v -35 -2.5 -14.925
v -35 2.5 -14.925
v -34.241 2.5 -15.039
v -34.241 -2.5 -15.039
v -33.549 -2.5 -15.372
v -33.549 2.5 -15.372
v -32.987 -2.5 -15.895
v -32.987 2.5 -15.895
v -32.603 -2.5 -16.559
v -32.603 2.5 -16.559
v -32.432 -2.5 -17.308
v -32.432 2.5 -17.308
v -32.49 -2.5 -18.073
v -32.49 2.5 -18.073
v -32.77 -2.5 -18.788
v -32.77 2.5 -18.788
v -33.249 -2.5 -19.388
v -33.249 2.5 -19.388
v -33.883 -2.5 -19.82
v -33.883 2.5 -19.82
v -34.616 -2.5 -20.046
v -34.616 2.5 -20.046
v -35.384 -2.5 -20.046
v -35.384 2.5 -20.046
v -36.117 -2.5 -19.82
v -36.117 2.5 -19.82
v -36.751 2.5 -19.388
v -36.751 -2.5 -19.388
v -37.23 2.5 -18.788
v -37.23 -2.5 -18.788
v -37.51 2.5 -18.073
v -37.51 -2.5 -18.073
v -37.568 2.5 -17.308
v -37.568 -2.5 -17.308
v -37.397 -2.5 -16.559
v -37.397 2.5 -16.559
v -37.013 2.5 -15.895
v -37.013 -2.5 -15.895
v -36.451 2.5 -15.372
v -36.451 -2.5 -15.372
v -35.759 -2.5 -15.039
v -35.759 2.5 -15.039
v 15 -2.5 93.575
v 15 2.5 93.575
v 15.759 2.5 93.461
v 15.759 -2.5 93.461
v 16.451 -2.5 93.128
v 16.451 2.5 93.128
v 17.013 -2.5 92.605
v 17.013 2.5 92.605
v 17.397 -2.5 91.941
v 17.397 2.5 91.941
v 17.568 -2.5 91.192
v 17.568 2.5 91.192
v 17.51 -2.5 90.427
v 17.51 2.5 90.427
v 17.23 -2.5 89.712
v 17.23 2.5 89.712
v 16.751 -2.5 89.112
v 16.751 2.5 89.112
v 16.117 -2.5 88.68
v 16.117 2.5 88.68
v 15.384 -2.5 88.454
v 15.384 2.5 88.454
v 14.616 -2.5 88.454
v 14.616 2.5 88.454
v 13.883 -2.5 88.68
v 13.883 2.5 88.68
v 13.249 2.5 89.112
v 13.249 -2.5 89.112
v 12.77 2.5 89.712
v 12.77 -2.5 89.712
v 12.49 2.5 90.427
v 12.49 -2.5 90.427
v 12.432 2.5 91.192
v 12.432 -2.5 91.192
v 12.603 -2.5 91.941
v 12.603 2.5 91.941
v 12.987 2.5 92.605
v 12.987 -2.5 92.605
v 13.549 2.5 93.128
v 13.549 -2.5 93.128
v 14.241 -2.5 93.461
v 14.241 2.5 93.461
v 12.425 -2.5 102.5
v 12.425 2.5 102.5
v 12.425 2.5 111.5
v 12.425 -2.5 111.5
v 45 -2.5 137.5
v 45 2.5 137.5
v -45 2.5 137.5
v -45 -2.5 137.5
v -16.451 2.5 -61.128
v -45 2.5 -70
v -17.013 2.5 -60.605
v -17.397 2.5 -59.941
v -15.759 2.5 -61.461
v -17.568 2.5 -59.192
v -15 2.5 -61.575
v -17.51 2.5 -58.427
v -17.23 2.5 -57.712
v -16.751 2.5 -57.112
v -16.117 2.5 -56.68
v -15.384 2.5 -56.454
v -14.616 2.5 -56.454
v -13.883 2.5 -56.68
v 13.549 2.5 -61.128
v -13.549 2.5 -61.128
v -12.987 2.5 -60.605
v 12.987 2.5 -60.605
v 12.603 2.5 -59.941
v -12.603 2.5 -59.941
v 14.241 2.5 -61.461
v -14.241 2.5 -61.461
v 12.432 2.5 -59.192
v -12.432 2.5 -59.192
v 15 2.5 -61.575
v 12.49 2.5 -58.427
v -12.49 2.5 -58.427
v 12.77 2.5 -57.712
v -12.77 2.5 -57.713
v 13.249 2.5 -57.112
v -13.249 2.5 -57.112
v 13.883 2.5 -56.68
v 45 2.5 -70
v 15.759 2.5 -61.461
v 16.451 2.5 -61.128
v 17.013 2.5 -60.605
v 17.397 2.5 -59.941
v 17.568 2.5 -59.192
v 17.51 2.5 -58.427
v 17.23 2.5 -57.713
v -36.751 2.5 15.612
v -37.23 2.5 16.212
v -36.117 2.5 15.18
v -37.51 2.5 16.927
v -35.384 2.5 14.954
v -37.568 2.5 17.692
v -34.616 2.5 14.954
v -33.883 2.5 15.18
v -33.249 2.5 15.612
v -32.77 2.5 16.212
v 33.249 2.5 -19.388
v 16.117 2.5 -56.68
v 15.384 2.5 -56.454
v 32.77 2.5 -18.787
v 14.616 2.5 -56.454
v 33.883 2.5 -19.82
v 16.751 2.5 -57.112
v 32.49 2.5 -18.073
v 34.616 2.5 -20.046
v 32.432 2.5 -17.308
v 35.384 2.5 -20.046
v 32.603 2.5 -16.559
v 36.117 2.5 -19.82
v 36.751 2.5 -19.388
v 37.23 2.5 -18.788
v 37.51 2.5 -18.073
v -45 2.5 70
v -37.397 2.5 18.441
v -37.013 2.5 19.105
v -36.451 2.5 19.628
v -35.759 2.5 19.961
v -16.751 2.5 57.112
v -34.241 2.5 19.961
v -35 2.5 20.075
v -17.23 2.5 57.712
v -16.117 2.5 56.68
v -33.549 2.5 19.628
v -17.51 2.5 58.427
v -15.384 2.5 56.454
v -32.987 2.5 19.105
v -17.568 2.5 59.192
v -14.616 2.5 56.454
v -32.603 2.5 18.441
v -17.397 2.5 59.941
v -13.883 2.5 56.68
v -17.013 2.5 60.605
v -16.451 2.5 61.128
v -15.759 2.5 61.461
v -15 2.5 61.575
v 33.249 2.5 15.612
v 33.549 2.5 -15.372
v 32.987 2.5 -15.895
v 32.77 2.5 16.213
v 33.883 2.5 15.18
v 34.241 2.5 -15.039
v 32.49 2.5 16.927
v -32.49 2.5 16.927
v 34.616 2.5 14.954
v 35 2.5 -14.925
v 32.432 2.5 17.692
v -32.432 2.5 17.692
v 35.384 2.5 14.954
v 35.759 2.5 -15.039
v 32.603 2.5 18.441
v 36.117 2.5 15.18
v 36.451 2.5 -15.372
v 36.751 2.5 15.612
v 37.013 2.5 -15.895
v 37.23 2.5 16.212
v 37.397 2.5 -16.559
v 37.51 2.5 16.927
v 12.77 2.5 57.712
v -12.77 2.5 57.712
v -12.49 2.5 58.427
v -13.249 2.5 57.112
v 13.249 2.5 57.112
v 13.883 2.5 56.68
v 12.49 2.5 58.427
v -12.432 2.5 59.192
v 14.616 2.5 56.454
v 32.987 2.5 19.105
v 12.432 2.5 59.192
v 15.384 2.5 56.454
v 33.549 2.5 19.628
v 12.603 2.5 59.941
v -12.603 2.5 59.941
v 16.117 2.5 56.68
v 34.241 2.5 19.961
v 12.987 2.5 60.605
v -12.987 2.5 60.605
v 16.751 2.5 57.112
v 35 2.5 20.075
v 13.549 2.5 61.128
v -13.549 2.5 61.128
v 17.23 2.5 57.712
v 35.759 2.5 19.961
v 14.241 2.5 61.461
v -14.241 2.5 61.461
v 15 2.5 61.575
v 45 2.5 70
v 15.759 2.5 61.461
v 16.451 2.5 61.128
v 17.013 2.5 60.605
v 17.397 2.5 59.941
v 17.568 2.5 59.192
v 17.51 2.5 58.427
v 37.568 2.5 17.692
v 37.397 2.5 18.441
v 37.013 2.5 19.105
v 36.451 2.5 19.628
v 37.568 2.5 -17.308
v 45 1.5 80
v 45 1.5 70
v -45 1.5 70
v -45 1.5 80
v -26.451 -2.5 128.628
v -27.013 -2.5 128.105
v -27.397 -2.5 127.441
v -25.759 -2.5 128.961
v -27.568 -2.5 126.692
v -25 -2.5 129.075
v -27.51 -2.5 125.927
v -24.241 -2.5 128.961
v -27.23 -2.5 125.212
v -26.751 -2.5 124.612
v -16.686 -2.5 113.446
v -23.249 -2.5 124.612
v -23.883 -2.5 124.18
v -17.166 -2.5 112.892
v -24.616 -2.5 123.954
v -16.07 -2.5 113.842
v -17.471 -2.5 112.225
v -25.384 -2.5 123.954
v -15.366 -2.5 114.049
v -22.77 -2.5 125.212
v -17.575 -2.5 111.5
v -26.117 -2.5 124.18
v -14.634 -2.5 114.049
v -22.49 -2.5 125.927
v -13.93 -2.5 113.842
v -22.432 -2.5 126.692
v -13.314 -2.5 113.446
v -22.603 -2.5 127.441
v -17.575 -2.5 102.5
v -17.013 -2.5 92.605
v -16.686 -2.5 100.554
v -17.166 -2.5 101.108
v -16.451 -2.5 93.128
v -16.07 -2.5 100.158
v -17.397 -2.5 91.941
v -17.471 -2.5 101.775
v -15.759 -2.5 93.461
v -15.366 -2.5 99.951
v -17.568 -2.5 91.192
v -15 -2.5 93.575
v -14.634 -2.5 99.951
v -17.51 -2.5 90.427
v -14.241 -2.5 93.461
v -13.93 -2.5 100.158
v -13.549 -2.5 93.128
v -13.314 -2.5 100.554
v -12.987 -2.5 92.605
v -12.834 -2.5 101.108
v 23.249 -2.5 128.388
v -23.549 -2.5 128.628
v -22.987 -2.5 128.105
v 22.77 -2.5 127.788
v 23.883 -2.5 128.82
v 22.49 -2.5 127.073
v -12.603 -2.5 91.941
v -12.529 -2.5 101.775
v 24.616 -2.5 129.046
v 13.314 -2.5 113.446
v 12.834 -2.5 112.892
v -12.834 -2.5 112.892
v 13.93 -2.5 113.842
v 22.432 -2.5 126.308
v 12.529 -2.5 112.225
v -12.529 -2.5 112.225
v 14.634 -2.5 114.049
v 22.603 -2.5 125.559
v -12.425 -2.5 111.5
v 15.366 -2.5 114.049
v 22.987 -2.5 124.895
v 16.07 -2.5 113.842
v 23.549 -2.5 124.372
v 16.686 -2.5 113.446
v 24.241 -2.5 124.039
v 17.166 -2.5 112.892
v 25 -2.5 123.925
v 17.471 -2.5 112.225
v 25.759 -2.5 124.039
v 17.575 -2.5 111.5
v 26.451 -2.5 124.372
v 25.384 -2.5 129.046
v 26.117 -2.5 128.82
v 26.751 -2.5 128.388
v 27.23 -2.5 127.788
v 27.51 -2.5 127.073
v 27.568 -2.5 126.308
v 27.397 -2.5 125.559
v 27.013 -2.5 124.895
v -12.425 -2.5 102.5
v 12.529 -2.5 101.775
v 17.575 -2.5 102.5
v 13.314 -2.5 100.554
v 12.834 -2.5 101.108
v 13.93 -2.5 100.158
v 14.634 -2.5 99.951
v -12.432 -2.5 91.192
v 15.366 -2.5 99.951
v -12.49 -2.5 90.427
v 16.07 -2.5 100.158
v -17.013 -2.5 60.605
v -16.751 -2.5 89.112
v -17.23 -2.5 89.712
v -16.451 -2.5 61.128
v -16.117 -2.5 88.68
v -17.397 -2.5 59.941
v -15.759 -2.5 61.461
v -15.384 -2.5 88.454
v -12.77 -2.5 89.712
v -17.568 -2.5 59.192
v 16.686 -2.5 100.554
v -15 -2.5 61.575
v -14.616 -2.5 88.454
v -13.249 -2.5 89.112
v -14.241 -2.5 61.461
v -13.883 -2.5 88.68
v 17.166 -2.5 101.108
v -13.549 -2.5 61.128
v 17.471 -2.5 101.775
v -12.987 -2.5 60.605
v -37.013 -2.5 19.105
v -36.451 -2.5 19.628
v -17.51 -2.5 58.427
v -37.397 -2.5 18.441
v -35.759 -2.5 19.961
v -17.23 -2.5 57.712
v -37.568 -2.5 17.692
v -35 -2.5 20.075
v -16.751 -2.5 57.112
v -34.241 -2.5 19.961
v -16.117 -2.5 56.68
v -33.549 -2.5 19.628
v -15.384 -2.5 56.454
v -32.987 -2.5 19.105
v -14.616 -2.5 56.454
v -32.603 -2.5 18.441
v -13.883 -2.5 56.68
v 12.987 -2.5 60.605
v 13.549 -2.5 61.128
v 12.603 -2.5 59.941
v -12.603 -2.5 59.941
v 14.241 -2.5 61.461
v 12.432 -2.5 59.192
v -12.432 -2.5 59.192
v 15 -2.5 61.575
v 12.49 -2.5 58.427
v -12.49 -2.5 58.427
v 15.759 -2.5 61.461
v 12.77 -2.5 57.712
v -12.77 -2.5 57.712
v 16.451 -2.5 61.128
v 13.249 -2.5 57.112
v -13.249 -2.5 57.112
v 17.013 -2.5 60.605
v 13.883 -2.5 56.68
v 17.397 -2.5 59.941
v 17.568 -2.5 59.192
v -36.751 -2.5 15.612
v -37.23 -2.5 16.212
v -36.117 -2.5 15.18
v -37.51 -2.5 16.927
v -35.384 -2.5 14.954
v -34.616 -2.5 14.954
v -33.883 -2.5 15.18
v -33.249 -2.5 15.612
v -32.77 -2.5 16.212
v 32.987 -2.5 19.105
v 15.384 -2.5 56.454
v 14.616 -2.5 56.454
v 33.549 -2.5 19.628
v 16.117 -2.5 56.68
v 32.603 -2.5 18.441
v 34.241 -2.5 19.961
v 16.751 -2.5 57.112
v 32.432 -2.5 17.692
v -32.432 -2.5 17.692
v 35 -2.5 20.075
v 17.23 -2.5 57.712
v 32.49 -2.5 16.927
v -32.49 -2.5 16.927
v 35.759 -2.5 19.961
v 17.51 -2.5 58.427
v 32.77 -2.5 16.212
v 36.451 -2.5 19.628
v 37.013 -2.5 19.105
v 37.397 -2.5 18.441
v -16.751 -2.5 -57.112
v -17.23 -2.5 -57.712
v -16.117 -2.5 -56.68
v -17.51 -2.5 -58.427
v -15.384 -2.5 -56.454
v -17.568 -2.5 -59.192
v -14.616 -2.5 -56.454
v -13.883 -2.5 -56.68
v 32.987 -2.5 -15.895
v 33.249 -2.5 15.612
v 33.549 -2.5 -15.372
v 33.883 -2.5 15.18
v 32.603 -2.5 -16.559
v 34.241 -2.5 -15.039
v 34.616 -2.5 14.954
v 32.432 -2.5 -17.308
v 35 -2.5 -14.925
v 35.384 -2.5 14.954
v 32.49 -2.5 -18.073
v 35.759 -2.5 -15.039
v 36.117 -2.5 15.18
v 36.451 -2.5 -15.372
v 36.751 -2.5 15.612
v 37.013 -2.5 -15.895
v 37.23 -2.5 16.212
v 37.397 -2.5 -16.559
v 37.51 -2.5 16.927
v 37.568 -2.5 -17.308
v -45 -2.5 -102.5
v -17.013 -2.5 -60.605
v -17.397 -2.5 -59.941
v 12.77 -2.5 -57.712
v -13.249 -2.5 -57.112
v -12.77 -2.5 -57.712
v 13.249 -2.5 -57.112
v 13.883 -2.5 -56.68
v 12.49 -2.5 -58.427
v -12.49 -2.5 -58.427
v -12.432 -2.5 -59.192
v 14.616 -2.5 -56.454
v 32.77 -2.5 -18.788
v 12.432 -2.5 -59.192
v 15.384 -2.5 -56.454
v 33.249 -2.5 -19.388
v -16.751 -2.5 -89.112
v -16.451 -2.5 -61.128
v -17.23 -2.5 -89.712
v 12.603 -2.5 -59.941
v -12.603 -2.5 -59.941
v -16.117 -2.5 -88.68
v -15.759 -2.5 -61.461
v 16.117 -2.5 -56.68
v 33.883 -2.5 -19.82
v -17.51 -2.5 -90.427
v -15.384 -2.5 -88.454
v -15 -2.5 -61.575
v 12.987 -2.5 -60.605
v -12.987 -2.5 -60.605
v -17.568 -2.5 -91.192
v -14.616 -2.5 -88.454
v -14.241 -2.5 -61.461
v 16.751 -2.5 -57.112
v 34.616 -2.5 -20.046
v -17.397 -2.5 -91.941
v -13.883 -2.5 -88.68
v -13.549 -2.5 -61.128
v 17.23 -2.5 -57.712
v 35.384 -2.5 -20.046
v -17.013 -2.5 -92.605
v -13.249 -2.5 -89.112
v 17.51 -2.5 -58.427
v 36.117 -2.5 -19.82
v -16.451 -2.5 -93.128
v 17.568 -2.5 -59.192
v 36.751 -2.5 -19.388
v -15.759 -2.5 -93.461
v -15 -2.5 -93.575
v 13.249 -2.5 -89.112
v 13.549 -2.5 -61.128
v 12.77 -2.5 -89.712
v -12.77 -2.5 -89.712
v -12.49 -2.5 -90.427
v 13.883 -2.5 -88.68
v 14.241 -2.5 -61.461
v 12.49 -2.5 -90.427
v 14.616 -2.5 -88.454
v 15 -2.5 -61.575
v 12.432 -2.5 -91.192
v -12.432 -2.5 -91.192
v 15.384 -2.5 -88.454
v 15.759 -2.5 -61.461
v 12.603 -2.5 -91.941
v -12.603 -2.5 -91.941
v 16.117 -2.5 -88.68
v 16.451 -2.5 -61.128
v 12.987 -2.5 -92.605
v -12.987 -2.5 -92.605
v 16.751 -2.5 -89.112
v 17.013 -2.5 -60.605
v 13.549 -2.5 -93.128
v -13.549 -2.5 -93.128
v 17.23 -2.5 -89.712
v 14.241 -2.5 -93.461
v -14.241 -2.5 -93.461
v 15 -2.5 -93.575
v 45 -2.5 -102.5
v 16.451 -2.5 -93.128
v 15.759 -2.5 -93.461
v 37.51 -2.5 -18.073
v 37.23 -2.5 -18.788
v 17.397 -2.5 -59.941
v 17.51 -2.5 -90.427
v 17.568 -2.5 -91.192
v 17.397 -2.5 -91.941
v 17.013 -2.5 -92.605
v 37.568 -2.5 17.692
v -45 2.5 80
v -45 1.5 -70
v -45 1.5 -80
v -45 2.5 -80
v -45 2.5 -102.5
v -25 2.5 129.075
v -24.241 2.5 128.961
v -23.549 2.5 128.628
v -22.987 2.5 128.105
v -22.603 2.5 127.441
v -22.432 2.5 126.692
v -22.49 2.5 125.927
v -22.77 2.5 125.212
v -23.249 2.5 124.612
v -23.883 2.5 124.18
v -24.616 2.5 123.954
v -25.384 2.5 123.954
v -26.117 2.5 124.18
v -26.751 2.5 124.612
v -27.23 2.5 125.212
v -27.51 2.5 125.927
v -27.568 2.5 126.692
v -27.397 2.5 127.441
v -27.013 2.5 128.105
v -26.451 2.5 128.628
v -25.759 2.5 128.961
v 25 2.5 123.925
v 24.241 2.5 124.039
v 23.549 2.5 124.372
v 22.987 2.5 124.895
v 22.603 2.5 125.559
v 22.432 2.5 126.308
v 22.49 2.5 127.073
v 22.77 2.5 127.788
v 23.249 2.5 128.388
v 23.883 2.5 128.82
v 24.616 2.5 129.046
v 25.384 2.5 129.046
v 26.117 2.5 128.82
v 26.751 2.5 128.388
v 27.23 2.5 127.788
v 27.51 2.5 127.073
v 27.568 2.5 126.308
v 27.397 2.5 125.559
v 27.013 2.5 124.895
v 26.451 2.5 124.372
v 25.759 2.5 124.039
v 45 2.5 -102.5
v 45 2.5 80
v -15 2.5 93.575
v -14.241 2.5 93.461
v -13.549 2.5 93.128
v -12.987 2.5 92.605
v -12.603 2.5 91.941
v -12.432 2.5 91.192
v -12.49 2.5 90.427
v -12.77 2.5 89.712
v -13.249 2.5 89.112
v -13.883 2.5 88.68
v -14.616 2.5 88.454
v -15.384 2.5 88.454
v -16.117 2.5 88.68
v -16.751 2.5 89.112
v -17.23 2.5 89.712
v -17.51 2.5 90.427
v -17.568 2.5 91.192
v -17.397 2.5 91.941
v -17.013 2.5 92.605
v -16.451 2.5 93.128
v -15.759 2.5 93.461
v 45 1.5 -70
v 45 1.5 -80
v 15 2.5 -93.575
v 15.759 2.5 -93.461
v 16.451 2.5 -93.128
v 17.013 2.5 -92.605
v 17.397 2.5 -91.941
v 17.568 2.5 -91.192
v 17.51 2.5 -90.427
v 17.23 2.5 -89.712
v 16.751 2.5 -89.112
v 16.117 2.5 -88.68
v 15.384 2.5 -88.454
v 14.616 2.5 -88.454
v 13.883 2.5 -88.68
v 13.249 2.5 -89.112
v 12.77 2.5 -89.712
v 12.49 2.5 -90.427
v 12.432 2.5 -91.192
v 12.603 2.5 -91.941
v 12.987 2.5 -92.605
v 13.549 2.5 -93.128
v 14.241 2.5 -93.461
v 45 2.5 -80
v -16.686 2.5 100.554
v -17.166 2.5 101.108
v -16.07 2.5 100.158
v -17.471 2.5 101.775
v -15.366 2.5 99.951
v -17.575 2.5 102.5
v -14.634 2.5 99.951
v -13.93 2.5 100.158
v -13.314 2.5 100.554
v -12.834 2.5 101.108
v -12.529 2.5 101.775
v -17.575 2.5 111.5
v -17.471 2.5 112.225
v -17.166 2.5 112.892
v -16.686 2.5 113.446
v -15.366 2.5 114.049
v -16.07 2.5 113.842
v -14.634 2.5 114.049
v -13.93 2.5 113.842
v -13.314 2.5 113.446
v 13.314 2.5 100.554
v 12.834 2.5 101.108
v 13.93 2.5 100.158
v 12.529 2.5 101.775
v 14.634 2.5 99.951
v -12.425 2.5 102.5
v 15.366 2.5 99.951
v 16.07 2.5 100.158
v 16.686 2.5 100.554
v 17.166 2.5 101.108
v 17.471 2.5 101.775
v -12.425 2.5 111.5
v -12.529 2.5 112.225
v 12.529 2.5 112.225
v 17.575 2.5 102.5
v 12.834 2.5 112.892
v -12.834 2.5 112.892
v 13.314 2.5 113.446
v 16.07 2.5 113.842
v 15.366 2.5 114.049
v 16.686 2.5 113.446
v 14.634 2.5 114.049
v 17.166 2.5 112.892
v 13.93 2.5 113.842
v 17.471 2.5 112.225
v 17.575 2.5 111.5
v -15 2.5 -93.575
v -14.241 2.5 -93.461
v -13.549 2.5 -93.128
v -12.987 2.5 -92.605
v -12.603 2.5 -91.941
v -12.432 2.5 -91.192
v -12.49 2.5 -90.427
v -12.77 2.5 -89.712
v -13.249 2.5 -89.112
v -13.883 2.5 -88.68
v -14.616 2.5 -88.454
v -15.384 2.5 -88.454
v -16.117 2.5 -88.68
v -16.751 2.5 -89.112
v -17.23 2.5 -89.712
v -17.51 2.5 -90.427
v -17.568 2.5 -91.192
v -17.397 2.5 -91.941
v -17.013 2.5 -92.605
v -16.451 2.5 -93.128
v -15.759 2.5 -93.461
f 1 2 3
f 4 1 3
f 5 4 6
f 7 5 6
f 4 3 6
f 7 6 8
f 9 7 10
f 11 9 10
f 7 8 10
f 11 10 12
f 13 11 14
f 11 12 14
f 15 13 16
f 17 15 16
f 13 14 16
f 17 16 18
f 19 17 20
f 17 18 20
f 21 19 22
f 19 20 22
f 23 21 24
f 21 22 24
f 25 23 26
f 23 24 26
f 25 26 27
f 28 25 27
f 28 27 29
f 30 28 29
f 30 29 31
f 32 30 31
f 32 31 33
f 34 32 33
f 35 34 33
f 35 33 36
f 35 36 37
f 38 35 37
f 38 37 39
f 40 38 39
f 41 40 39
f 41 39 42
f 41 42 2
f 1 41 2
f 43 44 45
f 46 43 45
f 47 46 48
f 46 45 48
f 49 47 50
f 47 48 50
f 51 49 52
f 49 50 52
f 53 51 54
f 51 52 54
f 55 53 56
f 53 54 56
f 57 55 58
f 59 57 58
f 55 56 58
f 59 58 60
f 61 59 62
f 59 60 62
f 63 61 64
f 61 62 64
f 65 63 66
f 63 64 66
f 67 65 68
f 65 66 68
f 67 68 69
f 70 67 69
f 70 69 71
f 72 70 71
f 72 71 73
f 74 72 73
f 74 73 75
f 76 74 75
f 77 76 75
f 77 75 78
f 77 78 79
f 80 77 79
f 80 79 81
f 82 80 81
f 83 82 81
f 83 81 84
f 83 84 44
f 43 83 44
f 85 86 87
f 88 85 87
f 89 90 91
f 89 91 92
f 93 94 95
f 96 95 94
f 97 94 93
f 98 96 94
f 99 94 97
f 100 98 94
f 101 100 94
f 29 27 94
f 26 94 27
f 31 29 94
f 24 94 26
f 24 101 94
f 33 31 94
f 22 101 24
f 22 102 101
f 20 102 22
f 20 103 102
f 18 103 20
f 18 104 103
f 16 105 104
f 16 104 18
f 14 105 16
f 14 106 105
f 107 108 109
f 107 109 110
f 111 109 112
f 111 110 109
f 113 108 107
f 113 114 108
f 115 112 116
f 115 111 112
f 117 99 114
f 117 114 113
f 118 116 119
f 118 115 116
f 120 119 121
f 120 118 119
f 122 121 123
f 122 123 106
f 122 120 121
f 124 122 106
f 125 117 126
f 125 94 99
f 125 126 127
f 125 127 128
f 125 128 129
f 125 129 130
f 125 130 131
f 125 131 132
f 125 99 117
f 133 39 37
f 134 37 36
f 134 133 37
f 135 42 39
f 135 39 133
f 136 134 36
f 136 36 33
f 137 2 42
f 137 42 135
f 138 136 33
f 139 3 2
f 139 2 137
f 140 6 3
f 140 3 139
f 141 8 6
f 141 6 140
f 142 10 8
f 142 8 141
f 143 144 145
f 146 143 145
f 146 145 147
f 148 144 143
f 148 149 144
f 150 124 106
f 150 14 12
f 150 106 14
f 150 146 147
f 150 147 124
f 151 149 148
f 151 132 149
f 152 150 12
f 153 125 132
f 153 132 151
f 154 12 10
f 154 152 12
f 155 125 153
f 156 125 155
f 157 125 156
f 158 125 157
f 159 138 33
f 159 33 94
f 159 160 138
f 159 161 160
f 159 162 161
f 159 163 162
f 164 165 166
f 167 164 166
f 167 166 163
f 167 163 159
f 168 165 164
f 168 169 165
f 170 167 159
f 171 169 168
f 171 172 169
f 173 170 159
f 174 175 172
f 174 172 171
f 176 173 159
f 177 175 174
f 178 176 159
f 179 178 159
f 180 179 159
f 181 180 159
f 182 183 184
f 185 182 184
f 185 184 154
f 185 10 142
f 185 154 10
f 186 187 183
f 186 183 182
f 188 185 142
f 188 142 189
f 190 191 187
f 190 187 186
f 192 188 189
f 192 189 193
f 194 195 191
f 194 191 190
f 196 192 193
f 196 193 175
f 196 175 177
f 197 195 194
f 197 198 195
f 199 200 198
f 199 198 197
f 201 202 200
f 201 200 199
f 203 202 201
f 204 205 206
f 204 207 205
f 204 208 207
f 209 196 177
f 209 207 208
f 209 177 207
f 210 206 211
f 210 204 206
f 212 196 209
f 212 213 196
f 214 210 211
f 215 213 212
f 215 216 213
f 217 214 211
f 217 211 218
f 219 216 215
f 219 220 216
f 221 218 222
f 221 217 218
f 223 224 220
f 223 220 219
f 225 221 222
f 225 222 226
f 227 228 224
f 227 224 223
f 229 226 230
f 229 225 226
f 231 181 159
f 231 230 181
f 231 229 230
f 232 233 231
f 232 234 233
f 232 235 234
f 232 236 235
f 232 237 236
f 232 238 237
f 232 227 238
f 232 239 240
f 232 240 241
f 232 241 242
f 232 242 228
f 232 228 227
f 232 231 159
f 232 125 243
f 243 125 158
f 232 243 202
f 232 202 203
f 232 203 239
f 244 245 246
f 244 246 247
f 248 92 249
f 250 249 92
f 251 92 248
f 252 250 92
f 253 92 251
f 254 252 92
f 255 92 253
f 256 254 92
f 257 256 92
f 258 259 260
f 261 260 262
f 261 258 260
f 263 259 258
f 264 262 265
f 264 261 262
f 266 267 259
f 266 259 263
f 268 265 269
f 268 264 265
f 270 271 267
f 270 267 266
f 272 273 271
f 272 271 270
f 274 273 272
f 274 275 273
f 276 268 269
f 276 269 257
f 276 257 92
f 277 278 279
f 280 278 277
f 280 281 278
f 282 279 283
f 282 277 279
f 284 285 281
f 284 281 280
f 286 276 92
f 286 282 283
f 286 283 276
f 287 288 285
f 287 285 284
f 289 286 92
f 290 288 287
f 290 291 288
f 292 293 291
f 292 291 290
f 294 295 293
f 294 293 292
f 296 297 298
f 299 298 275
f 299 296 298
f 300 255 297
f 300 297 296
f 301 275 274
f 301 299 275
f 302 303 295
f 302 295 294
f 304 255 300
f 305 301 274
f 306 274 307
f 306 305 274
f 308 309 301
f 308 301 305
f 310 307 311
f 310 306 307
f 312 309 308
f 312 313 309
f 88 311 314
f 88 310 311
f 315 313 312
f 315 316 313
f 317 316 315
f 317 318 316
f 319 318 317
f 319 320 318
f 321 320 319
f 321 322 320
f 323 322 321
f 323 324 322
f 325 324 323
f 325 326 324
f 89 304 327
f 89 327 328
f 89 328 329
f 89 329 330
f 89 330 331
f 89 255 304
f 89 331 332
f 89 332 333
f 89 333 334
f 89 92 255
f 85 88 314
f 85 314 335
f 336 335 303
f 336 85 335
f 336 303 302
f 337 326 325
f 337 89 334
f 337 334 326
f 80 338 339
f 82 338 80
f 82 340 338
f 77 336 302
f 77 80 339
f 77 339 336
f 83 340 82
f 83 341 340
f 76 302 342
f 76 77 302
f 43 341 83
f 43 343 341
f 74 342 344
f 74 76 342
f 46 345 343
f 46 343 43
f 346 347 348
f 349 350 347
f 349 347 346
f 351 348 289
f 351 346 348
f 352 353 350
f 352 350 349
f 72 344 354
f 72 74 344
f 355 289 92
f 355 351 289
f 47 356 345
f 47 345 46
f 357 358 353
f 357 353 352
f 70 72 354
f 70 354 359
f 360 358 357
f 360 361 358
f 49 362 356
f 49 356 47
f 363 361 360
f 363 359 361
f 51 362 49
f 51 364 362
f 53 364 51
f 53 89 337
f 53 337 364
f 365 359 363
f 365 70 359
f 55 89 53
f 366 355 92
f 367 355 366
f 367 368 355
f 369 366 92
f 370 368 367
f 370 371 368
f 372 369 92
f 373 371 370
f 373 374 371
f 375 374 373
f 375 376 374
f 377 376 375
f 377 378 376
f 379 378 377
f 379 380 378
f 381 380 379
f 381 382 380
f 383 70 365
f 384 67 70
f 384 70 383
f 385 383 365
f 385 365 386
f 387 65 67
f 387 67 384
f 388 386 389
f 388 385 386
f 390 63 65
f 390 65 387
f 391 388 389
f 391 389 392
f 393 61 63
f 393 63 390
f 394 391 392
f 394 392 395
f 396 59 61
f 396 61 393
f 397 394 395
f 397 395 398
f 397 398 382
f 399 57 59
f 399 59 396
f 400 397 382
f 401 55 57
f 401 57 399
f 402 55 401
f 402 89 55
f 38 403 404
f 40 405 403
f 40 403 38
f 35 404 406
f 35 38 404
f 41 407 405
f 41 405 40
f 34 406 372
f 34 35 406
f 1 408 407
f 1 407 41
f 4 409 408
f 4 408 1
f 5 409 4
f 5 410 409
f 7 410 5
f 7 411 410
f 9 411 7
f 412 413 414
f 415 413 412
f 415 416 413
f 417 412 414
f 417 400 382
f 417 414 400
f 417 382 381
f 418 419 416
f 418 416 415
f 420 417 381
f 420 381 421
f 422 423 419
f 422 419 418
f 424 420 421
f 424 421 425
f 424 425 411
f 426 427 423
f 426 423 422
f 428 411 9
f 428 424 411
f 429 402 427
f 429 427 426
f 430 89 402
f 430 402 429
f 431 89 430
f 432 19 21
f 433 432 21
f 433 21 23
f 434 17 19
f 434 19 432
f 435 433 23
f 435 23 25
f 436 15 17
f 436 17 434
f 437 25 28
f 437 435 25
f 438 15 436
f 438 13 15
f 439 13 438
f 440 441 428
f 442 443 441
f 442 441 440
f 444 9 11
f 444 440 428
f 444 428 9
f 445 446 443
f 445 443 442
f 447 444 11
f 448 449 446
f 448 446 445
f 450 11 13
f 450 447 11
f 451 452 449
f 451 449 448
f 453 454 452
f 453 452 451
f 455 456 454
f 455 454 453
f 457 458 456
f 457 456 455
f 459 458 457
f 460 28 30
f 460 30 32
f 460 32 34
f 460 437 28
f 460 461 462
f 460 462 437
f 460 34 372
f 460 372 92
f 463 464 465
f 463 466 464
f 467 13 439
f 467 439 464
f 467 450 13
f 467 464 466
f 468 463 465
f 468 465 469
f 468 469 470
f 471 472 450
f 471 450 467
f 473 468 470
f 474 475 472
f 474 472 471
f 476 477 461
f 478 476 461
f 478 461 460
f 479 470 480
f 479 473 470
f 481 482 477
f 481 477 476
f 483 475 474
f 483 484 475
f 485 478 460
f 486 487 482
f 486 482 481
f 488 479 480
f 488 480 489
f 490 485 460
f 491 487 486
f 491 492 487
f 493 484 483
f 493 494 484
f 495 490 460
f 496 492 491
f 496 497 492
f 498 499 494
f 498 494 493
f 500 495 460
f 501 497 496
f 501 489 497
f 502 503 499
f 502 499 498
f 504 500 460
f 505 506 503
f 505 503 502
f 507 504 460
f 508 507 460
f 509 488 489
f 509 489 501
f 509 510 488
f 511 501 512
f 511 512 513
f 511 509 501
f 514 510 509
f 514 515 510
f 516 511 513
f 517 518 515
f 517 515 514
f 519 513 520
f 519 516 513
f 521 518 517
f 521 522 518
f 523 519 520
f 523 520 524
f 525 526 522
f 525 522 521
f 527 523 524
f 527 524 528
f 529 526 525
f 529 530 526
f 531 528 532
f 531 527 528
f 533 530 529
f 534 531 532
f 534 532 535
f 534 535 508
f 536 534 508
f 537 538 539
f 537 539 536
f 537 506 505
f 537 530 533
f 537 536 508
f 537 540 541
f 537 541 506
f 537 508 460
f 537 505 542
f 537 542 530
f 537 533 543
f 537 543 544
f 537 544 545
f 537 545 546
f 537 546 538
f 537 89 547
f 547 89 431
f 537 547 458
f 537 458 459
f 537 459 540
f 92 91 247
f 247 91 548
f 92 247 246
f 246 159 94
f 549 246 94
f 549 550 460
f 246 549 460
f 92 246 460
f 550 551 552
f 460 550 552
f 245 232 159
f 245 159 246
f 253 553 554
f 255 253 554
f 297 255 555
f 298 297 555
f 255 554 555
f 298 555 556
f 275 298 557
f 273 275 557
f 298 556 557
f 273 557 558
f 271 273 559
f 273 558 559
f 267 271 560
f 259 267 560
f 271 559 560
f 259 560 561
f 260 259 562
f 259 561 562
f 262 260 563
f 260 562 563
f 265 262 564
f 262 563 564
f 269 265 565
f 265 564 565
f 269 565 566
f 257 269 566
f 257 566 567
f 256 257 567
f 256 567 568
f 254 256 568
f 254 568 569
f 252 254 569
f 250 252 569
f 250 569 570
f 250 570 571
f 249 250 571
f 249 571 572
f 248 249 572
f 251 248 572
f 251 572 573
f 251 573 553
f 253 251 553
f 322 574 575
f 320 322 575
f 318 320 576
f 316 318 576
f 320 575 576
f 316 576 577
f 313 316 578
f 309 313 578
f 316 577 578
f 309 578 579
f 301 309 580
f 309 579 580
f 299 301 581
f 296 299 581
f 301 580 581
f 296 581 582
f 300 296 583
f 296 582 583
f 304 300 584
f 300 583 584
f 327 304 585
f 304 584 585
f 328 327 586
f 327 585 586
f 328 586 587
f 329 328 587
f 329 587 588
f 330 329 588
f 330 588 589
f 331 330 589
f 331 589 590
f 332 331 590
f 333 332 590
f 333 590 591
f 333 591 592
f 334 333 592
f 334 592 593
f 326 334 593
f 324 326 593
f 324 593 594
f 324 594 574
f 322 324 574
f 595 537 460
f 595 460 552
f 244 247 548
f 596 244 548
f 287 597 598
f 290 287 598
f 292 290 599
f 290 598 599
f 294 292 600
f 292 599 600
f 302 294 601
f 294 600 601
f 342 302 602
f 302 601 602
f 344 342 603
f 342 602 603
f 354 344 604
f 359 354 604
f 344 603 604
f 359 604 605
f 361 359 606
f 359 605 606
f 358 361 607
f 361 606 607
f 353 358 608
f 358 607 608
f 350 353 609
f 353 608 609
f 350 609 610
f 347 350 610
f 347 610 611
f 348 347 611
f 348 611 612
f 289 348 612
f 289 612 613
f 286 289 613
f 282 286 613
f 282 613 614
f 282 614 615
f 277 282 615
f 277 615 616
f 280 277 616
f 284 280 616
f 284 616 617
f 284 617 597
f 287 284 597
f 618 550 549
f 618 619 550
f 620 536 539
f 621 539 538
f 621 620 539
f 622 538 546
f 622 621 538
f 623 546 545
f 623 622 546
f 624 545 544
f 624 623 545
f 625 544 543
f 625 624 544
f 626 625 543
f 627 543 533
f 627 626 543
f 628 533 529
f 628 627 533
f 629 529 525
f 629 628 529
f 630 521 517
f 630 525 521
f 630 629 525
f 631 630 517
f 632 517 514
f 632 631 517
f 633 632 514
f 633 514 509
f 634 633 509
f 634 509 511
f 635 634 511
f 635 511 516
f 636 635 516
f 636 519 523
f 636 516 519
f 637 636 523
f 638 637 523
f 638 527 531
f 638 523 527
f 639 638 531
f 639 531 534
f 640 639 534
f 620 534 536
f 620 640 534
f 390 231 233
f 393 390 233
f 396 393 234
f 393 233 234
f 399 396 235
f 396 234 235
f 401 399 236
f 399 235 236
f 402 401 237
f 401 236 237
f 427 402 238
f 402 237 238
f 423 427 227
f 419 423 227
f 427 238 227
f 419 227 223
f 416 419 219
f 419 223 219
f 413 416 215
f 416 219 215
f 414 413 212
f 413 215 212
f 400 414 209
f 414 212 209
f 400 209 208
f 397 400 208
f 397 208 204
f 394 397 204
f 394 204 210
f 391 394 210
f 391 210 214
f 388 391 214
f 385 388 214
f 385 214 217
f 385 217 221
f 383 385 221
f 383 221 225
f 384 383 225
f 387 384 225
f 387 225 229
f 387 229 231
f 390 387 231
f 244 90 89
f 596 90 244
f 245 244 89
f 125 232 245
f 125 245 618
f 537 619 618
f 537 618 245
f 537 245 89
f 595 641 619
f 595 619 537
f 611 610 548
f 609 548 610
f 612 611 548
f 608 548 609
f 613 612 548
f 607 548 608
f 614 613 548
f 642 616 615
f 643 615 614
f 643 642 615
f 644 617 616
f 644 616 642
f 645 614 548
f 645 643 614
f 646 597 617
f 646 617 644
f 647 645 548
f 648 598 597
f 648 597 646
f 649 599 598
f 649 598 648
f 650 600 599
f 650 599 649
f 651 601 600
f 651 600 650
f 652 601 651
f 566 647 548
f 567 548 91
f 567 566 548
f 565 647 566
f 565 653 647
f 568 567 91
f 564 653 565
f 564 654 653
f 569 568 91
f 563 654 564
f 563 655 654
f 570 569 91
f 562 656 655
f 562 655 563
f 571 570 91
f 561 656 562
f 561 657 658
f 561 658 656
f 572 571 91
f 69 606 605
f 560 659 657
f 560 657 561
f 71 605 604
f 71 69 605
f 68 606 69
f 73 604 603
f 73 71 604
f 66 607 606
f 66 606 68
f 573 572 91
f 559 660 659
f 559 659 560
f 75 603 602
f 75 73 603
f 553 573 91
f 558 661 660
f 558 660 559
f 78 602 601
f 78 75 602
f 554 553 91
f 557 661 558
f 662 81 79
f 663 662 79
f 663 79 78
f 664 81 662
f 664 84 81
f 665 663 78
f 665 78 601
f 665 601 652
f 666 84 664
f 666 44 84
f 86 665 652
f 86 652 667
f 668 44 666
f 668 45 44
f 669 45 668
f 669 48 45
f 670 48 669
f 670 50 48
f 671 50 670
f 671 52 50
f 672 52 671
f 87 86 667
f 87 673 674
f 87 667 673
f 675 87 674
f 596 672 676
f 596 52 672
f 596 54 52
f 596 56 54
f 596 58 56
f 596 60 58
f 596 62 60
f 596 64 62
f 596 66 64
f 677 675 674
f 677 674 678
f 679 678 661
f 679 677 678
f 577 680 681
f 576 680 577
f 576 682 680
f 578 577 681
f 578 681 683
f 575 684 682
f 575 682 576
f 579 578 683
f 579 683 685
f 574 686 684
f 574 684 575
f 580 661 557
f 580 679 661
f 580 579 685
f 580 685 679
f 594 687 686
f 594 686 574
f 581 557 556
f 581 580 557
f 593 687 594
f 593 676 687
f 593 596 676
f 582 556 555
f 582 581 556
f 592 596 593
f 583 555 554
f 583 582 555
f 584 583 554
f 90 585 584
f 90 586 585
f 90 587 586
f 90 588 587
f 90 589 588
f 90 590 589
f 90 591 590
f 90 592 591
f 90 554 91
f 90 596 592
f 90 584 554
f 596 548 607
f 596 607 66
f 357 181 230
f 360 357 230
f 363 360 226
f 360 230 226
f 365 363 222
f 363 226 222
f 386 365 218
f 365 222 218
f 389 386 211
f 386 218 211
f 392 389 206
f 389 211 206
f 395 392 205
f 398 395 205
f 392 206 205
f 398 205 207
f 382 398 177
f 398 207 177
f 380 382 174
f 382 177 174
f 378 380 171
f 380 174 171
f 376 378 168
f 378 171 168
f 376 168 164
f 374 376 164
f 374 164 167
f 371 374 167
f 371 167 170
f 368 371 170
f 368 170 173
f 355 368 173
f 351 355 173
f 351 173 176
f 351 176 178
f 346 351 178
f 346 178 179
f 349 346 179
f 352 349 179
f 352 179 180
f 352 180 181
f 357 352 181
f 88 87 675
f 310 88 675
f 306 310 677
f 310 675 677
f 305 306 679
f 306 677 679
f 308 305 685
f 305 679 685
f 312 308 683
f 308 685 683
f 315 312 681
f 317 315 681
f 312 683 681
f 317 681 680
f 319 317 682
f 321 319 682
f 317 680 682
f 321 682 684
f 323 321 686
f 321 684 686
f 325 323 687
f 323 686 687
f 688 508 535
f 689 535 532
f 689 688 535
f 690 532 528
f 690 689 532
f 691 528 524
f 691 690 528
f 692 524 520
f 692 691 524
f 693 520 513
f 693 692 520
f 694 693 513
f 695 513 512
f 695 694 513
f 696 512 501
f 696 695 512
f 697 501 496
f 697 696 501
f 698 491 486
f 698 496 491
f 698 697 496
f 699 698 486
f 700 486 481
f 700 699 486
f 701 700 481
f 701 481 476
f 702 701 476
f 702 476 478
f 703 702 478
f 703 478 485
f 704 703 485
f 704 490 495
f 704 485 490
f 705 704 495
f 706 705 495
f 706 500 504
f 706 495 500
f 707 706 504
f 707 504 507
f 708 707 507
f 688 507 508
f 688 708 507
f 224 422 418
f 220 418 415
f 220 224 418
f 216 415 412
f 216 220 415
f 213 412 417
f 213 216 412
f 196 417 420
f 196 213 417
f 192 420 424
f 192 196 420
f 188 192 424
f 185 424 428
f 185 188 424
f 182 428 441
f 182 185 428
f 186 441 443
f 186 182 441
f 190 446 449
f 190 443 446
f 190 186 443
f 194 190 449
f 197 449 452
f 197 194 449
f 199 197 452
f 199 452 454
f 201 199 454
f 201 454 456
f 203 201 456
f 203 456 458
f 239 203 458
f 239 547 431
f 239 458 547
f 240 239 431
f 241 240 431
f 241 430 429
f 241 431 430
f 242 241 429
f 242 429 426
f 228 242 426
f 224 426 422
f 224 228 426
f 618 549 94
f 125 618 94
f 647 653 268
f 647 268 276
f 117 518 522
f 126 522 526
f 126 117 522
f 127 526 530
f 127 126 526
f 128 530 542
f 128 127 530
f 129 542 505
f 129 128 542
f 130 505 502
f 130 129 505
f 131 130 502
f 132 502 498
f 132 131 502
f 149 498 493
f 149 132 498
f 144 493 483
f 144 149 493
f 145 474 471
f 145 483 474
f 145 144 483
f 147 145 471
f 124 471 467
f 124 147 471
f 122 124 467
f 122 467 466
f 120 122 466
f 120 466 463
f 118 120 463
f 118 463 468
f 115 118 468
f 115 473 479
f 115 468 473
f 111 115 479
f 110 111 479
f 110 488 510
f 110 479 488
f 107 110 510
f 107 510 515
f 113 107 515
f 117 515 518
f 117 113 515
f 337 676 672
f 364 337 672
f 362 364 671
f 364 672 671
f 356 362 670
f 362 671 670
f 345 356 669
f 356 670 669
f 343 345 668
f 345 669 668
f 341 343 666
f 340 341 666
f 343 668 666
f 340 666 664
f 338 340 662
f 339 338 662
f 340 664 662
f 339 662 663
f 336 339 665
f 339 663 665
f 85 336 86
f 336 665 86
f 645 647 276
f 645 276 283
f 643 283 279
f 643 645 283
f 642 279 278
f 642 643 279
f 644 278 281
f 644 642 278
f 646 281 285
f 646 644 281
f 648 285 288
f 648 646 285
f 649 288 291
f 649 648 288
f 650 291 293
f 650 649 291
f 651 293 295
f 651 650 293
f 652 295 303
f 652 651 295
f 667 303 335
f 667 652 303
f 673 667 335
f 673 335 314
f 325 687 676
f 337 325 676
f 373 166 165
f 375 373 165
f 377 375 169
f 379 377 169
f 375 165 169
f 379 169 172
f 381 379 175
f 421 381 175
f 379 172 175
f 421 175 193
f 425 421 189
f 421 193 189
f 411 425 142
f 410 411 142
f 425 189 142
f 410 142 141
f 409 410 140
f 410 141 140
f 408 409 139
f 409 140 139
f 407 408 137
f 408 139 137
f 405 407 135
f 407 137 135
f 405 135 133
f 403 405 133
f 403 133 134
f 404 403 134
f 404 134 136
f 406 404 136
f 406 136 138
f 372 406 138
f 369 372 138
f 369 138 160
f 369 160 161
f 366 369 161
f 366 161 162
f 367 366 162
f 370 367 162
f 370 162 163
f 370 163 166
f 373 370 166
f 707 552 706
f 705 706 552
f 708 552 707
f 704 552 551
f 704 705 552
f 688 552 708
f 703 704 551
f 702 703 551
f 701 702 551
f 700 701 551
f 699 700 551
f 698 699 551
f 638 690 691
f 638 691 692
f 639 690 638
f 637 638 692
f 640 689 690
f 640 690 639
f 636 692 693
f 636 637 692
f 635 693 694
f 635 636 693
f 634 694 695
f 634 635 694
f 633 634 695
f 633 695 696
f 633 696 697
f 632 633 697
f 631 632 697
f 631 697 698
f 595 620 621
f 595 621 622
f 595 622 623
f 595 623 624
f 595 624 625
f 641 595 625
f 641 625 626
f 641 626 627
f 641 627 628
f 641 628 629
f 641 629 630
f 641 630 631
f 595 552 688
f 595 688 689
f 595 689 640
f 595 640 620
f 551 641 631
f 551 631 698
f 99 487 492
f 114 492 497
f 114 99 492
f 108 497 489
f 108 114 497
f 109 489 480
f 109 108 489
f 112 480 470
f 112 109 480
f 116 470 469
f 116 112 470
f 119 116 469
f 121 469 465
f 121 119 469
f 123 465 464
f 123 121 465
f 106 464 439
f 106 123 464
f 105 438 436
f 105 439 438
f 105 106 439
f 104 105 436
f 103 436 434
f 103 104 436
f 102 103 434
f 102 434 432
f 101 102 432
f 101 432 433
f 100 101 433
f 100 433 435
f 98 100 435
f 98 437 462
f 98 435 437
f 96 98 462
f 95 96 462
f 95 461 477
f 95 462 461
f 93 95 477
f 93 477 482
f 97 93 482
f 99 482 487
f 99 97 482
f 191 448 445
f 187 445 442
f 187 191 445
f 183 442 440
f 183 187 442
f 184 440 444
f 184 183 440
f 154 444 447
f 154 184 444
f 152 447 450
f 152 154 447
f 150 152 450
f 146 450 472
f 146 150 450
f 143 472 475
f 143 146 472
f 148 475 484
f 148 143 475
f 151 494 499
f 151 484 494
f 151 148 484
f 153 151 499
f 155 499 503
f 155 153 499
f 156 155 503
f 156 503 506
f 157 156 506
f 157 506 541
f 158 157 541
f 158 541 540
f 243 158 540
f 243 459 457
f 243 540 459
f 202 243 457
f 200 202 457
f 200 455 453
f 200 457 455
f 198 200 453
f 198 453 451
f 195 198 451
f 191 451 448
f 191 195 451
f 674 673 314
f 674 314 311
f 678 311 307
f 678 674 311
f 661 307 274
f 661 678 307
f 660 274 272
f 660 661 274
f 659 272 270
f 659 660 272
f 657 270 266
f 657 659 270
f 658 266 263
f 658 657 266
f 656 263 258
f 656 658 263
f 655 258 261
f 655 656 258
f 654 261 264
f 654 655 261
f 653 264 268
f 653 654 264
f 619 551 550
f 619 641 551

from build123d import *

# Parameters (mm, degrees)
SKETCH1_W           = 45
SKETCH1_H           = 5
BOSS_EXTRUDE1_DEPTH = 102.5
SKETCH2_R           = 2.575
CUT_EXTRUDE1_DEPTH  = 106.059506947
SKETCH3_W           = 10
SKETCH3_H           = 1
CUT_EXTRUDE2_DEPTH  = 112.970978383
SKETCH4_W           = 45
SKETCH4_H           = 5
BOSS_EXTRUDE2_DEPTH = 35
BOSS_EXTRUDE3_DEPTH = 22.5
SKETCH6_R           = 2.575
CUT_EXTRUDE3_DEPTH  = 145.762736918
SKETCH7_R           = 2.575
CUT_EXTRUDE4_DEPTH  = 145.762736918
CUT_EXTRUDE5_DEPTH  = 145.762736918


with BuildPart() as part:
    # Sketch1 → Boss-Extrude1 (new body)
    with BuildSketch(Plane.XY):
        Rectangle(SKETCH1_W, SKETCH1_H)
    boss_extrude1 = extrude(amount=BOSS_EXTRUDE1_DEPTH)

    # Sketch2 → Cut-Extrude1 (cut, through all)
    with BuildSketch(Plane(origin=(0, 2.5, 0), x_dir=(1, 0, 0), z_dir=(0, 1, 0))):
        with Locations(Location((-15, -59, 0), (0, 0, 270))):
            Circle(SKETCH2_R)
        with Locations(Location((15, -59, 0), (0, 0, 270))):
            Circle(SKETCH2_R)
        with Locations(Location((-15, -91, 0), (0, 0, 270))):
            Circle(SKETCH2_R)
        with Locations(Location((15, -91, 0), (0, 0, 270))):
            Circle(SKETCH2_R)
    cut_extrude1 = extrude(amount=-CUT_EXTRUDE1_DEPTH, mode=Mode.SUBTRACT)

    # Sketch3 → Cut-Extrude2 (cut, through all)
    with BuildSketch(Plane(origin=(22.5, 0, 0), x_dir=(0, 0, -1), z_dir=(1, 0, 0))):
        with Locations((-75, 2)):
            Rectangle(SKETCH3_W, SKETCH3_H)
    cut_extrude2 = extrude(amount=-CUT_EXTRUDE2_DEPTH, mode=Mode.SUBTRACT)

    # Mirror1: Boss-Extrude1, Cut-Extrude1, Cut-Extrude2 across plane
    add(boss_extrude1.mirror(Plane.XY))
    add(cut_extrude1.mirror(Plane.XY), mode=Mode.SUBTRACT)
    add(cut_extrude2.mirror(Plane.XY), mode=Mode.SUBTRACT)

    # Sketch4 → Boss-Extrude2 (add)
    with BuildSketch(Plane.XY.offset(102.5)):
        Rectangle(SKETCH4_W, SKETCH4_H)
    extrude(amount=BOSS_EXTRUDE2_DEPTH)

    # Sketch5 → Boss-Extrude3 (add)
    with BuildSketch(Plane(origin=(22.5, 0, 0), x_dir=(0, 0, -1), z_dir=(1, 0, 0))):
        Polygon((70, 1.5), (70, 2.5), (-70, 2.5), (-70, 1.5), (-80, 1.5), (-80, 2.5), (-137.5, 2.5), (-137.5, -2.5), (102.5, -2.5), (102.5, 2.5), (80, 2.5), (80, 1.5), align=None)
    boss_extrude3 = extrude(amount=BOSS_EXTRUDE3_DEPTH)

    # Mirror2: Boss-Extrude3 across plane
    add(boss_extrude3.mirror(Plane(origin=(0, 0, 0), x_dir=(0, 0, 1), z_dir=(1, 0, 0))))

    # Sketch6 → Cut-Extrude3 (cut, through all)
    with BuildSketch(Plane(origin=(0, 2.5, 0), x_dir=(1, 0, 0), z_dir=(0, 1, 0))):
        with Locations(Location((-35, -17.5, 0), (0, 0, 270))):
            Circle(SKETCH6_R)
        with Locations(Location((-35, 17.5, 0), (0, 0, 270))):
            Circle(SKETCH6_R)
    cut_extrude3 = extrude(amount=-CUT_EXTRUDE3_DEPTH, mode=Mode.SUBTRACT)

    # Mirror3: Cut-Extrude3 across plane
    add(cut_extrude3.mirror(Plane(origin=(0, 0, 0), x_dir=(0, 0, 1), z_dir=(1, 0, 0))), mode=Mode.SUBTRACT)

    # Sketch7 → Cut-Extrude4 (cut, through all)
    with BuildSketch(Plane(origin=(0, 2.5, 0), x_dir=(1, 0, 0), z_dir=(0, 1, 0))):
        with Locations(Location((-25, -126.5, 0), (0, 0, 270))):
            Circle(SKETCH7_R)
        with Locations(Location((25, -126.5, 0), (0, 0, 90))):
            Circle(SKETCH7_R)
    extrude(amount=-CUT_EXTRUDE4_DEPTH, mode=Mode.SUBTRACT)

    # Sketch8 → Cut-Extrude5 (cut, through all)
    with BuildSketch(Plane(origin=(0, 2.5, 0), x_dir=(1, 0, 0), z_dir=(0, 1, 0))):
        with BuildLine():
            Line((-17.575, -111.5), (-17.575, -102.5))
            ThreePointArc((-17.575, -102.5), (-15, -99.925), (-12.425, -102.5))
            Line((-12.425, -102.5), (-12.425, -111.5))
            ThreePointArc((-12.425, -111.5), (-15, -114.075), (-17.575, -111.5))
        make_face()
        with BuildLine():
            Line((17.575, -111.5), (17.575, -102.5))
            ThreePointArc((17.575, -102.5), (15, -99.925), (12.425, -102.5))
            Line((12.425, -102.5), (12.425, -111.5))
            ThreePointArc((12.425, -111.5), (15, -114.075), (17.575, -111.5))
        make_face()
    extrude(amount=-CUT_EXTRUDE5_DEPTH, mode=Mode.SUBTRACT)


solid = part.part
